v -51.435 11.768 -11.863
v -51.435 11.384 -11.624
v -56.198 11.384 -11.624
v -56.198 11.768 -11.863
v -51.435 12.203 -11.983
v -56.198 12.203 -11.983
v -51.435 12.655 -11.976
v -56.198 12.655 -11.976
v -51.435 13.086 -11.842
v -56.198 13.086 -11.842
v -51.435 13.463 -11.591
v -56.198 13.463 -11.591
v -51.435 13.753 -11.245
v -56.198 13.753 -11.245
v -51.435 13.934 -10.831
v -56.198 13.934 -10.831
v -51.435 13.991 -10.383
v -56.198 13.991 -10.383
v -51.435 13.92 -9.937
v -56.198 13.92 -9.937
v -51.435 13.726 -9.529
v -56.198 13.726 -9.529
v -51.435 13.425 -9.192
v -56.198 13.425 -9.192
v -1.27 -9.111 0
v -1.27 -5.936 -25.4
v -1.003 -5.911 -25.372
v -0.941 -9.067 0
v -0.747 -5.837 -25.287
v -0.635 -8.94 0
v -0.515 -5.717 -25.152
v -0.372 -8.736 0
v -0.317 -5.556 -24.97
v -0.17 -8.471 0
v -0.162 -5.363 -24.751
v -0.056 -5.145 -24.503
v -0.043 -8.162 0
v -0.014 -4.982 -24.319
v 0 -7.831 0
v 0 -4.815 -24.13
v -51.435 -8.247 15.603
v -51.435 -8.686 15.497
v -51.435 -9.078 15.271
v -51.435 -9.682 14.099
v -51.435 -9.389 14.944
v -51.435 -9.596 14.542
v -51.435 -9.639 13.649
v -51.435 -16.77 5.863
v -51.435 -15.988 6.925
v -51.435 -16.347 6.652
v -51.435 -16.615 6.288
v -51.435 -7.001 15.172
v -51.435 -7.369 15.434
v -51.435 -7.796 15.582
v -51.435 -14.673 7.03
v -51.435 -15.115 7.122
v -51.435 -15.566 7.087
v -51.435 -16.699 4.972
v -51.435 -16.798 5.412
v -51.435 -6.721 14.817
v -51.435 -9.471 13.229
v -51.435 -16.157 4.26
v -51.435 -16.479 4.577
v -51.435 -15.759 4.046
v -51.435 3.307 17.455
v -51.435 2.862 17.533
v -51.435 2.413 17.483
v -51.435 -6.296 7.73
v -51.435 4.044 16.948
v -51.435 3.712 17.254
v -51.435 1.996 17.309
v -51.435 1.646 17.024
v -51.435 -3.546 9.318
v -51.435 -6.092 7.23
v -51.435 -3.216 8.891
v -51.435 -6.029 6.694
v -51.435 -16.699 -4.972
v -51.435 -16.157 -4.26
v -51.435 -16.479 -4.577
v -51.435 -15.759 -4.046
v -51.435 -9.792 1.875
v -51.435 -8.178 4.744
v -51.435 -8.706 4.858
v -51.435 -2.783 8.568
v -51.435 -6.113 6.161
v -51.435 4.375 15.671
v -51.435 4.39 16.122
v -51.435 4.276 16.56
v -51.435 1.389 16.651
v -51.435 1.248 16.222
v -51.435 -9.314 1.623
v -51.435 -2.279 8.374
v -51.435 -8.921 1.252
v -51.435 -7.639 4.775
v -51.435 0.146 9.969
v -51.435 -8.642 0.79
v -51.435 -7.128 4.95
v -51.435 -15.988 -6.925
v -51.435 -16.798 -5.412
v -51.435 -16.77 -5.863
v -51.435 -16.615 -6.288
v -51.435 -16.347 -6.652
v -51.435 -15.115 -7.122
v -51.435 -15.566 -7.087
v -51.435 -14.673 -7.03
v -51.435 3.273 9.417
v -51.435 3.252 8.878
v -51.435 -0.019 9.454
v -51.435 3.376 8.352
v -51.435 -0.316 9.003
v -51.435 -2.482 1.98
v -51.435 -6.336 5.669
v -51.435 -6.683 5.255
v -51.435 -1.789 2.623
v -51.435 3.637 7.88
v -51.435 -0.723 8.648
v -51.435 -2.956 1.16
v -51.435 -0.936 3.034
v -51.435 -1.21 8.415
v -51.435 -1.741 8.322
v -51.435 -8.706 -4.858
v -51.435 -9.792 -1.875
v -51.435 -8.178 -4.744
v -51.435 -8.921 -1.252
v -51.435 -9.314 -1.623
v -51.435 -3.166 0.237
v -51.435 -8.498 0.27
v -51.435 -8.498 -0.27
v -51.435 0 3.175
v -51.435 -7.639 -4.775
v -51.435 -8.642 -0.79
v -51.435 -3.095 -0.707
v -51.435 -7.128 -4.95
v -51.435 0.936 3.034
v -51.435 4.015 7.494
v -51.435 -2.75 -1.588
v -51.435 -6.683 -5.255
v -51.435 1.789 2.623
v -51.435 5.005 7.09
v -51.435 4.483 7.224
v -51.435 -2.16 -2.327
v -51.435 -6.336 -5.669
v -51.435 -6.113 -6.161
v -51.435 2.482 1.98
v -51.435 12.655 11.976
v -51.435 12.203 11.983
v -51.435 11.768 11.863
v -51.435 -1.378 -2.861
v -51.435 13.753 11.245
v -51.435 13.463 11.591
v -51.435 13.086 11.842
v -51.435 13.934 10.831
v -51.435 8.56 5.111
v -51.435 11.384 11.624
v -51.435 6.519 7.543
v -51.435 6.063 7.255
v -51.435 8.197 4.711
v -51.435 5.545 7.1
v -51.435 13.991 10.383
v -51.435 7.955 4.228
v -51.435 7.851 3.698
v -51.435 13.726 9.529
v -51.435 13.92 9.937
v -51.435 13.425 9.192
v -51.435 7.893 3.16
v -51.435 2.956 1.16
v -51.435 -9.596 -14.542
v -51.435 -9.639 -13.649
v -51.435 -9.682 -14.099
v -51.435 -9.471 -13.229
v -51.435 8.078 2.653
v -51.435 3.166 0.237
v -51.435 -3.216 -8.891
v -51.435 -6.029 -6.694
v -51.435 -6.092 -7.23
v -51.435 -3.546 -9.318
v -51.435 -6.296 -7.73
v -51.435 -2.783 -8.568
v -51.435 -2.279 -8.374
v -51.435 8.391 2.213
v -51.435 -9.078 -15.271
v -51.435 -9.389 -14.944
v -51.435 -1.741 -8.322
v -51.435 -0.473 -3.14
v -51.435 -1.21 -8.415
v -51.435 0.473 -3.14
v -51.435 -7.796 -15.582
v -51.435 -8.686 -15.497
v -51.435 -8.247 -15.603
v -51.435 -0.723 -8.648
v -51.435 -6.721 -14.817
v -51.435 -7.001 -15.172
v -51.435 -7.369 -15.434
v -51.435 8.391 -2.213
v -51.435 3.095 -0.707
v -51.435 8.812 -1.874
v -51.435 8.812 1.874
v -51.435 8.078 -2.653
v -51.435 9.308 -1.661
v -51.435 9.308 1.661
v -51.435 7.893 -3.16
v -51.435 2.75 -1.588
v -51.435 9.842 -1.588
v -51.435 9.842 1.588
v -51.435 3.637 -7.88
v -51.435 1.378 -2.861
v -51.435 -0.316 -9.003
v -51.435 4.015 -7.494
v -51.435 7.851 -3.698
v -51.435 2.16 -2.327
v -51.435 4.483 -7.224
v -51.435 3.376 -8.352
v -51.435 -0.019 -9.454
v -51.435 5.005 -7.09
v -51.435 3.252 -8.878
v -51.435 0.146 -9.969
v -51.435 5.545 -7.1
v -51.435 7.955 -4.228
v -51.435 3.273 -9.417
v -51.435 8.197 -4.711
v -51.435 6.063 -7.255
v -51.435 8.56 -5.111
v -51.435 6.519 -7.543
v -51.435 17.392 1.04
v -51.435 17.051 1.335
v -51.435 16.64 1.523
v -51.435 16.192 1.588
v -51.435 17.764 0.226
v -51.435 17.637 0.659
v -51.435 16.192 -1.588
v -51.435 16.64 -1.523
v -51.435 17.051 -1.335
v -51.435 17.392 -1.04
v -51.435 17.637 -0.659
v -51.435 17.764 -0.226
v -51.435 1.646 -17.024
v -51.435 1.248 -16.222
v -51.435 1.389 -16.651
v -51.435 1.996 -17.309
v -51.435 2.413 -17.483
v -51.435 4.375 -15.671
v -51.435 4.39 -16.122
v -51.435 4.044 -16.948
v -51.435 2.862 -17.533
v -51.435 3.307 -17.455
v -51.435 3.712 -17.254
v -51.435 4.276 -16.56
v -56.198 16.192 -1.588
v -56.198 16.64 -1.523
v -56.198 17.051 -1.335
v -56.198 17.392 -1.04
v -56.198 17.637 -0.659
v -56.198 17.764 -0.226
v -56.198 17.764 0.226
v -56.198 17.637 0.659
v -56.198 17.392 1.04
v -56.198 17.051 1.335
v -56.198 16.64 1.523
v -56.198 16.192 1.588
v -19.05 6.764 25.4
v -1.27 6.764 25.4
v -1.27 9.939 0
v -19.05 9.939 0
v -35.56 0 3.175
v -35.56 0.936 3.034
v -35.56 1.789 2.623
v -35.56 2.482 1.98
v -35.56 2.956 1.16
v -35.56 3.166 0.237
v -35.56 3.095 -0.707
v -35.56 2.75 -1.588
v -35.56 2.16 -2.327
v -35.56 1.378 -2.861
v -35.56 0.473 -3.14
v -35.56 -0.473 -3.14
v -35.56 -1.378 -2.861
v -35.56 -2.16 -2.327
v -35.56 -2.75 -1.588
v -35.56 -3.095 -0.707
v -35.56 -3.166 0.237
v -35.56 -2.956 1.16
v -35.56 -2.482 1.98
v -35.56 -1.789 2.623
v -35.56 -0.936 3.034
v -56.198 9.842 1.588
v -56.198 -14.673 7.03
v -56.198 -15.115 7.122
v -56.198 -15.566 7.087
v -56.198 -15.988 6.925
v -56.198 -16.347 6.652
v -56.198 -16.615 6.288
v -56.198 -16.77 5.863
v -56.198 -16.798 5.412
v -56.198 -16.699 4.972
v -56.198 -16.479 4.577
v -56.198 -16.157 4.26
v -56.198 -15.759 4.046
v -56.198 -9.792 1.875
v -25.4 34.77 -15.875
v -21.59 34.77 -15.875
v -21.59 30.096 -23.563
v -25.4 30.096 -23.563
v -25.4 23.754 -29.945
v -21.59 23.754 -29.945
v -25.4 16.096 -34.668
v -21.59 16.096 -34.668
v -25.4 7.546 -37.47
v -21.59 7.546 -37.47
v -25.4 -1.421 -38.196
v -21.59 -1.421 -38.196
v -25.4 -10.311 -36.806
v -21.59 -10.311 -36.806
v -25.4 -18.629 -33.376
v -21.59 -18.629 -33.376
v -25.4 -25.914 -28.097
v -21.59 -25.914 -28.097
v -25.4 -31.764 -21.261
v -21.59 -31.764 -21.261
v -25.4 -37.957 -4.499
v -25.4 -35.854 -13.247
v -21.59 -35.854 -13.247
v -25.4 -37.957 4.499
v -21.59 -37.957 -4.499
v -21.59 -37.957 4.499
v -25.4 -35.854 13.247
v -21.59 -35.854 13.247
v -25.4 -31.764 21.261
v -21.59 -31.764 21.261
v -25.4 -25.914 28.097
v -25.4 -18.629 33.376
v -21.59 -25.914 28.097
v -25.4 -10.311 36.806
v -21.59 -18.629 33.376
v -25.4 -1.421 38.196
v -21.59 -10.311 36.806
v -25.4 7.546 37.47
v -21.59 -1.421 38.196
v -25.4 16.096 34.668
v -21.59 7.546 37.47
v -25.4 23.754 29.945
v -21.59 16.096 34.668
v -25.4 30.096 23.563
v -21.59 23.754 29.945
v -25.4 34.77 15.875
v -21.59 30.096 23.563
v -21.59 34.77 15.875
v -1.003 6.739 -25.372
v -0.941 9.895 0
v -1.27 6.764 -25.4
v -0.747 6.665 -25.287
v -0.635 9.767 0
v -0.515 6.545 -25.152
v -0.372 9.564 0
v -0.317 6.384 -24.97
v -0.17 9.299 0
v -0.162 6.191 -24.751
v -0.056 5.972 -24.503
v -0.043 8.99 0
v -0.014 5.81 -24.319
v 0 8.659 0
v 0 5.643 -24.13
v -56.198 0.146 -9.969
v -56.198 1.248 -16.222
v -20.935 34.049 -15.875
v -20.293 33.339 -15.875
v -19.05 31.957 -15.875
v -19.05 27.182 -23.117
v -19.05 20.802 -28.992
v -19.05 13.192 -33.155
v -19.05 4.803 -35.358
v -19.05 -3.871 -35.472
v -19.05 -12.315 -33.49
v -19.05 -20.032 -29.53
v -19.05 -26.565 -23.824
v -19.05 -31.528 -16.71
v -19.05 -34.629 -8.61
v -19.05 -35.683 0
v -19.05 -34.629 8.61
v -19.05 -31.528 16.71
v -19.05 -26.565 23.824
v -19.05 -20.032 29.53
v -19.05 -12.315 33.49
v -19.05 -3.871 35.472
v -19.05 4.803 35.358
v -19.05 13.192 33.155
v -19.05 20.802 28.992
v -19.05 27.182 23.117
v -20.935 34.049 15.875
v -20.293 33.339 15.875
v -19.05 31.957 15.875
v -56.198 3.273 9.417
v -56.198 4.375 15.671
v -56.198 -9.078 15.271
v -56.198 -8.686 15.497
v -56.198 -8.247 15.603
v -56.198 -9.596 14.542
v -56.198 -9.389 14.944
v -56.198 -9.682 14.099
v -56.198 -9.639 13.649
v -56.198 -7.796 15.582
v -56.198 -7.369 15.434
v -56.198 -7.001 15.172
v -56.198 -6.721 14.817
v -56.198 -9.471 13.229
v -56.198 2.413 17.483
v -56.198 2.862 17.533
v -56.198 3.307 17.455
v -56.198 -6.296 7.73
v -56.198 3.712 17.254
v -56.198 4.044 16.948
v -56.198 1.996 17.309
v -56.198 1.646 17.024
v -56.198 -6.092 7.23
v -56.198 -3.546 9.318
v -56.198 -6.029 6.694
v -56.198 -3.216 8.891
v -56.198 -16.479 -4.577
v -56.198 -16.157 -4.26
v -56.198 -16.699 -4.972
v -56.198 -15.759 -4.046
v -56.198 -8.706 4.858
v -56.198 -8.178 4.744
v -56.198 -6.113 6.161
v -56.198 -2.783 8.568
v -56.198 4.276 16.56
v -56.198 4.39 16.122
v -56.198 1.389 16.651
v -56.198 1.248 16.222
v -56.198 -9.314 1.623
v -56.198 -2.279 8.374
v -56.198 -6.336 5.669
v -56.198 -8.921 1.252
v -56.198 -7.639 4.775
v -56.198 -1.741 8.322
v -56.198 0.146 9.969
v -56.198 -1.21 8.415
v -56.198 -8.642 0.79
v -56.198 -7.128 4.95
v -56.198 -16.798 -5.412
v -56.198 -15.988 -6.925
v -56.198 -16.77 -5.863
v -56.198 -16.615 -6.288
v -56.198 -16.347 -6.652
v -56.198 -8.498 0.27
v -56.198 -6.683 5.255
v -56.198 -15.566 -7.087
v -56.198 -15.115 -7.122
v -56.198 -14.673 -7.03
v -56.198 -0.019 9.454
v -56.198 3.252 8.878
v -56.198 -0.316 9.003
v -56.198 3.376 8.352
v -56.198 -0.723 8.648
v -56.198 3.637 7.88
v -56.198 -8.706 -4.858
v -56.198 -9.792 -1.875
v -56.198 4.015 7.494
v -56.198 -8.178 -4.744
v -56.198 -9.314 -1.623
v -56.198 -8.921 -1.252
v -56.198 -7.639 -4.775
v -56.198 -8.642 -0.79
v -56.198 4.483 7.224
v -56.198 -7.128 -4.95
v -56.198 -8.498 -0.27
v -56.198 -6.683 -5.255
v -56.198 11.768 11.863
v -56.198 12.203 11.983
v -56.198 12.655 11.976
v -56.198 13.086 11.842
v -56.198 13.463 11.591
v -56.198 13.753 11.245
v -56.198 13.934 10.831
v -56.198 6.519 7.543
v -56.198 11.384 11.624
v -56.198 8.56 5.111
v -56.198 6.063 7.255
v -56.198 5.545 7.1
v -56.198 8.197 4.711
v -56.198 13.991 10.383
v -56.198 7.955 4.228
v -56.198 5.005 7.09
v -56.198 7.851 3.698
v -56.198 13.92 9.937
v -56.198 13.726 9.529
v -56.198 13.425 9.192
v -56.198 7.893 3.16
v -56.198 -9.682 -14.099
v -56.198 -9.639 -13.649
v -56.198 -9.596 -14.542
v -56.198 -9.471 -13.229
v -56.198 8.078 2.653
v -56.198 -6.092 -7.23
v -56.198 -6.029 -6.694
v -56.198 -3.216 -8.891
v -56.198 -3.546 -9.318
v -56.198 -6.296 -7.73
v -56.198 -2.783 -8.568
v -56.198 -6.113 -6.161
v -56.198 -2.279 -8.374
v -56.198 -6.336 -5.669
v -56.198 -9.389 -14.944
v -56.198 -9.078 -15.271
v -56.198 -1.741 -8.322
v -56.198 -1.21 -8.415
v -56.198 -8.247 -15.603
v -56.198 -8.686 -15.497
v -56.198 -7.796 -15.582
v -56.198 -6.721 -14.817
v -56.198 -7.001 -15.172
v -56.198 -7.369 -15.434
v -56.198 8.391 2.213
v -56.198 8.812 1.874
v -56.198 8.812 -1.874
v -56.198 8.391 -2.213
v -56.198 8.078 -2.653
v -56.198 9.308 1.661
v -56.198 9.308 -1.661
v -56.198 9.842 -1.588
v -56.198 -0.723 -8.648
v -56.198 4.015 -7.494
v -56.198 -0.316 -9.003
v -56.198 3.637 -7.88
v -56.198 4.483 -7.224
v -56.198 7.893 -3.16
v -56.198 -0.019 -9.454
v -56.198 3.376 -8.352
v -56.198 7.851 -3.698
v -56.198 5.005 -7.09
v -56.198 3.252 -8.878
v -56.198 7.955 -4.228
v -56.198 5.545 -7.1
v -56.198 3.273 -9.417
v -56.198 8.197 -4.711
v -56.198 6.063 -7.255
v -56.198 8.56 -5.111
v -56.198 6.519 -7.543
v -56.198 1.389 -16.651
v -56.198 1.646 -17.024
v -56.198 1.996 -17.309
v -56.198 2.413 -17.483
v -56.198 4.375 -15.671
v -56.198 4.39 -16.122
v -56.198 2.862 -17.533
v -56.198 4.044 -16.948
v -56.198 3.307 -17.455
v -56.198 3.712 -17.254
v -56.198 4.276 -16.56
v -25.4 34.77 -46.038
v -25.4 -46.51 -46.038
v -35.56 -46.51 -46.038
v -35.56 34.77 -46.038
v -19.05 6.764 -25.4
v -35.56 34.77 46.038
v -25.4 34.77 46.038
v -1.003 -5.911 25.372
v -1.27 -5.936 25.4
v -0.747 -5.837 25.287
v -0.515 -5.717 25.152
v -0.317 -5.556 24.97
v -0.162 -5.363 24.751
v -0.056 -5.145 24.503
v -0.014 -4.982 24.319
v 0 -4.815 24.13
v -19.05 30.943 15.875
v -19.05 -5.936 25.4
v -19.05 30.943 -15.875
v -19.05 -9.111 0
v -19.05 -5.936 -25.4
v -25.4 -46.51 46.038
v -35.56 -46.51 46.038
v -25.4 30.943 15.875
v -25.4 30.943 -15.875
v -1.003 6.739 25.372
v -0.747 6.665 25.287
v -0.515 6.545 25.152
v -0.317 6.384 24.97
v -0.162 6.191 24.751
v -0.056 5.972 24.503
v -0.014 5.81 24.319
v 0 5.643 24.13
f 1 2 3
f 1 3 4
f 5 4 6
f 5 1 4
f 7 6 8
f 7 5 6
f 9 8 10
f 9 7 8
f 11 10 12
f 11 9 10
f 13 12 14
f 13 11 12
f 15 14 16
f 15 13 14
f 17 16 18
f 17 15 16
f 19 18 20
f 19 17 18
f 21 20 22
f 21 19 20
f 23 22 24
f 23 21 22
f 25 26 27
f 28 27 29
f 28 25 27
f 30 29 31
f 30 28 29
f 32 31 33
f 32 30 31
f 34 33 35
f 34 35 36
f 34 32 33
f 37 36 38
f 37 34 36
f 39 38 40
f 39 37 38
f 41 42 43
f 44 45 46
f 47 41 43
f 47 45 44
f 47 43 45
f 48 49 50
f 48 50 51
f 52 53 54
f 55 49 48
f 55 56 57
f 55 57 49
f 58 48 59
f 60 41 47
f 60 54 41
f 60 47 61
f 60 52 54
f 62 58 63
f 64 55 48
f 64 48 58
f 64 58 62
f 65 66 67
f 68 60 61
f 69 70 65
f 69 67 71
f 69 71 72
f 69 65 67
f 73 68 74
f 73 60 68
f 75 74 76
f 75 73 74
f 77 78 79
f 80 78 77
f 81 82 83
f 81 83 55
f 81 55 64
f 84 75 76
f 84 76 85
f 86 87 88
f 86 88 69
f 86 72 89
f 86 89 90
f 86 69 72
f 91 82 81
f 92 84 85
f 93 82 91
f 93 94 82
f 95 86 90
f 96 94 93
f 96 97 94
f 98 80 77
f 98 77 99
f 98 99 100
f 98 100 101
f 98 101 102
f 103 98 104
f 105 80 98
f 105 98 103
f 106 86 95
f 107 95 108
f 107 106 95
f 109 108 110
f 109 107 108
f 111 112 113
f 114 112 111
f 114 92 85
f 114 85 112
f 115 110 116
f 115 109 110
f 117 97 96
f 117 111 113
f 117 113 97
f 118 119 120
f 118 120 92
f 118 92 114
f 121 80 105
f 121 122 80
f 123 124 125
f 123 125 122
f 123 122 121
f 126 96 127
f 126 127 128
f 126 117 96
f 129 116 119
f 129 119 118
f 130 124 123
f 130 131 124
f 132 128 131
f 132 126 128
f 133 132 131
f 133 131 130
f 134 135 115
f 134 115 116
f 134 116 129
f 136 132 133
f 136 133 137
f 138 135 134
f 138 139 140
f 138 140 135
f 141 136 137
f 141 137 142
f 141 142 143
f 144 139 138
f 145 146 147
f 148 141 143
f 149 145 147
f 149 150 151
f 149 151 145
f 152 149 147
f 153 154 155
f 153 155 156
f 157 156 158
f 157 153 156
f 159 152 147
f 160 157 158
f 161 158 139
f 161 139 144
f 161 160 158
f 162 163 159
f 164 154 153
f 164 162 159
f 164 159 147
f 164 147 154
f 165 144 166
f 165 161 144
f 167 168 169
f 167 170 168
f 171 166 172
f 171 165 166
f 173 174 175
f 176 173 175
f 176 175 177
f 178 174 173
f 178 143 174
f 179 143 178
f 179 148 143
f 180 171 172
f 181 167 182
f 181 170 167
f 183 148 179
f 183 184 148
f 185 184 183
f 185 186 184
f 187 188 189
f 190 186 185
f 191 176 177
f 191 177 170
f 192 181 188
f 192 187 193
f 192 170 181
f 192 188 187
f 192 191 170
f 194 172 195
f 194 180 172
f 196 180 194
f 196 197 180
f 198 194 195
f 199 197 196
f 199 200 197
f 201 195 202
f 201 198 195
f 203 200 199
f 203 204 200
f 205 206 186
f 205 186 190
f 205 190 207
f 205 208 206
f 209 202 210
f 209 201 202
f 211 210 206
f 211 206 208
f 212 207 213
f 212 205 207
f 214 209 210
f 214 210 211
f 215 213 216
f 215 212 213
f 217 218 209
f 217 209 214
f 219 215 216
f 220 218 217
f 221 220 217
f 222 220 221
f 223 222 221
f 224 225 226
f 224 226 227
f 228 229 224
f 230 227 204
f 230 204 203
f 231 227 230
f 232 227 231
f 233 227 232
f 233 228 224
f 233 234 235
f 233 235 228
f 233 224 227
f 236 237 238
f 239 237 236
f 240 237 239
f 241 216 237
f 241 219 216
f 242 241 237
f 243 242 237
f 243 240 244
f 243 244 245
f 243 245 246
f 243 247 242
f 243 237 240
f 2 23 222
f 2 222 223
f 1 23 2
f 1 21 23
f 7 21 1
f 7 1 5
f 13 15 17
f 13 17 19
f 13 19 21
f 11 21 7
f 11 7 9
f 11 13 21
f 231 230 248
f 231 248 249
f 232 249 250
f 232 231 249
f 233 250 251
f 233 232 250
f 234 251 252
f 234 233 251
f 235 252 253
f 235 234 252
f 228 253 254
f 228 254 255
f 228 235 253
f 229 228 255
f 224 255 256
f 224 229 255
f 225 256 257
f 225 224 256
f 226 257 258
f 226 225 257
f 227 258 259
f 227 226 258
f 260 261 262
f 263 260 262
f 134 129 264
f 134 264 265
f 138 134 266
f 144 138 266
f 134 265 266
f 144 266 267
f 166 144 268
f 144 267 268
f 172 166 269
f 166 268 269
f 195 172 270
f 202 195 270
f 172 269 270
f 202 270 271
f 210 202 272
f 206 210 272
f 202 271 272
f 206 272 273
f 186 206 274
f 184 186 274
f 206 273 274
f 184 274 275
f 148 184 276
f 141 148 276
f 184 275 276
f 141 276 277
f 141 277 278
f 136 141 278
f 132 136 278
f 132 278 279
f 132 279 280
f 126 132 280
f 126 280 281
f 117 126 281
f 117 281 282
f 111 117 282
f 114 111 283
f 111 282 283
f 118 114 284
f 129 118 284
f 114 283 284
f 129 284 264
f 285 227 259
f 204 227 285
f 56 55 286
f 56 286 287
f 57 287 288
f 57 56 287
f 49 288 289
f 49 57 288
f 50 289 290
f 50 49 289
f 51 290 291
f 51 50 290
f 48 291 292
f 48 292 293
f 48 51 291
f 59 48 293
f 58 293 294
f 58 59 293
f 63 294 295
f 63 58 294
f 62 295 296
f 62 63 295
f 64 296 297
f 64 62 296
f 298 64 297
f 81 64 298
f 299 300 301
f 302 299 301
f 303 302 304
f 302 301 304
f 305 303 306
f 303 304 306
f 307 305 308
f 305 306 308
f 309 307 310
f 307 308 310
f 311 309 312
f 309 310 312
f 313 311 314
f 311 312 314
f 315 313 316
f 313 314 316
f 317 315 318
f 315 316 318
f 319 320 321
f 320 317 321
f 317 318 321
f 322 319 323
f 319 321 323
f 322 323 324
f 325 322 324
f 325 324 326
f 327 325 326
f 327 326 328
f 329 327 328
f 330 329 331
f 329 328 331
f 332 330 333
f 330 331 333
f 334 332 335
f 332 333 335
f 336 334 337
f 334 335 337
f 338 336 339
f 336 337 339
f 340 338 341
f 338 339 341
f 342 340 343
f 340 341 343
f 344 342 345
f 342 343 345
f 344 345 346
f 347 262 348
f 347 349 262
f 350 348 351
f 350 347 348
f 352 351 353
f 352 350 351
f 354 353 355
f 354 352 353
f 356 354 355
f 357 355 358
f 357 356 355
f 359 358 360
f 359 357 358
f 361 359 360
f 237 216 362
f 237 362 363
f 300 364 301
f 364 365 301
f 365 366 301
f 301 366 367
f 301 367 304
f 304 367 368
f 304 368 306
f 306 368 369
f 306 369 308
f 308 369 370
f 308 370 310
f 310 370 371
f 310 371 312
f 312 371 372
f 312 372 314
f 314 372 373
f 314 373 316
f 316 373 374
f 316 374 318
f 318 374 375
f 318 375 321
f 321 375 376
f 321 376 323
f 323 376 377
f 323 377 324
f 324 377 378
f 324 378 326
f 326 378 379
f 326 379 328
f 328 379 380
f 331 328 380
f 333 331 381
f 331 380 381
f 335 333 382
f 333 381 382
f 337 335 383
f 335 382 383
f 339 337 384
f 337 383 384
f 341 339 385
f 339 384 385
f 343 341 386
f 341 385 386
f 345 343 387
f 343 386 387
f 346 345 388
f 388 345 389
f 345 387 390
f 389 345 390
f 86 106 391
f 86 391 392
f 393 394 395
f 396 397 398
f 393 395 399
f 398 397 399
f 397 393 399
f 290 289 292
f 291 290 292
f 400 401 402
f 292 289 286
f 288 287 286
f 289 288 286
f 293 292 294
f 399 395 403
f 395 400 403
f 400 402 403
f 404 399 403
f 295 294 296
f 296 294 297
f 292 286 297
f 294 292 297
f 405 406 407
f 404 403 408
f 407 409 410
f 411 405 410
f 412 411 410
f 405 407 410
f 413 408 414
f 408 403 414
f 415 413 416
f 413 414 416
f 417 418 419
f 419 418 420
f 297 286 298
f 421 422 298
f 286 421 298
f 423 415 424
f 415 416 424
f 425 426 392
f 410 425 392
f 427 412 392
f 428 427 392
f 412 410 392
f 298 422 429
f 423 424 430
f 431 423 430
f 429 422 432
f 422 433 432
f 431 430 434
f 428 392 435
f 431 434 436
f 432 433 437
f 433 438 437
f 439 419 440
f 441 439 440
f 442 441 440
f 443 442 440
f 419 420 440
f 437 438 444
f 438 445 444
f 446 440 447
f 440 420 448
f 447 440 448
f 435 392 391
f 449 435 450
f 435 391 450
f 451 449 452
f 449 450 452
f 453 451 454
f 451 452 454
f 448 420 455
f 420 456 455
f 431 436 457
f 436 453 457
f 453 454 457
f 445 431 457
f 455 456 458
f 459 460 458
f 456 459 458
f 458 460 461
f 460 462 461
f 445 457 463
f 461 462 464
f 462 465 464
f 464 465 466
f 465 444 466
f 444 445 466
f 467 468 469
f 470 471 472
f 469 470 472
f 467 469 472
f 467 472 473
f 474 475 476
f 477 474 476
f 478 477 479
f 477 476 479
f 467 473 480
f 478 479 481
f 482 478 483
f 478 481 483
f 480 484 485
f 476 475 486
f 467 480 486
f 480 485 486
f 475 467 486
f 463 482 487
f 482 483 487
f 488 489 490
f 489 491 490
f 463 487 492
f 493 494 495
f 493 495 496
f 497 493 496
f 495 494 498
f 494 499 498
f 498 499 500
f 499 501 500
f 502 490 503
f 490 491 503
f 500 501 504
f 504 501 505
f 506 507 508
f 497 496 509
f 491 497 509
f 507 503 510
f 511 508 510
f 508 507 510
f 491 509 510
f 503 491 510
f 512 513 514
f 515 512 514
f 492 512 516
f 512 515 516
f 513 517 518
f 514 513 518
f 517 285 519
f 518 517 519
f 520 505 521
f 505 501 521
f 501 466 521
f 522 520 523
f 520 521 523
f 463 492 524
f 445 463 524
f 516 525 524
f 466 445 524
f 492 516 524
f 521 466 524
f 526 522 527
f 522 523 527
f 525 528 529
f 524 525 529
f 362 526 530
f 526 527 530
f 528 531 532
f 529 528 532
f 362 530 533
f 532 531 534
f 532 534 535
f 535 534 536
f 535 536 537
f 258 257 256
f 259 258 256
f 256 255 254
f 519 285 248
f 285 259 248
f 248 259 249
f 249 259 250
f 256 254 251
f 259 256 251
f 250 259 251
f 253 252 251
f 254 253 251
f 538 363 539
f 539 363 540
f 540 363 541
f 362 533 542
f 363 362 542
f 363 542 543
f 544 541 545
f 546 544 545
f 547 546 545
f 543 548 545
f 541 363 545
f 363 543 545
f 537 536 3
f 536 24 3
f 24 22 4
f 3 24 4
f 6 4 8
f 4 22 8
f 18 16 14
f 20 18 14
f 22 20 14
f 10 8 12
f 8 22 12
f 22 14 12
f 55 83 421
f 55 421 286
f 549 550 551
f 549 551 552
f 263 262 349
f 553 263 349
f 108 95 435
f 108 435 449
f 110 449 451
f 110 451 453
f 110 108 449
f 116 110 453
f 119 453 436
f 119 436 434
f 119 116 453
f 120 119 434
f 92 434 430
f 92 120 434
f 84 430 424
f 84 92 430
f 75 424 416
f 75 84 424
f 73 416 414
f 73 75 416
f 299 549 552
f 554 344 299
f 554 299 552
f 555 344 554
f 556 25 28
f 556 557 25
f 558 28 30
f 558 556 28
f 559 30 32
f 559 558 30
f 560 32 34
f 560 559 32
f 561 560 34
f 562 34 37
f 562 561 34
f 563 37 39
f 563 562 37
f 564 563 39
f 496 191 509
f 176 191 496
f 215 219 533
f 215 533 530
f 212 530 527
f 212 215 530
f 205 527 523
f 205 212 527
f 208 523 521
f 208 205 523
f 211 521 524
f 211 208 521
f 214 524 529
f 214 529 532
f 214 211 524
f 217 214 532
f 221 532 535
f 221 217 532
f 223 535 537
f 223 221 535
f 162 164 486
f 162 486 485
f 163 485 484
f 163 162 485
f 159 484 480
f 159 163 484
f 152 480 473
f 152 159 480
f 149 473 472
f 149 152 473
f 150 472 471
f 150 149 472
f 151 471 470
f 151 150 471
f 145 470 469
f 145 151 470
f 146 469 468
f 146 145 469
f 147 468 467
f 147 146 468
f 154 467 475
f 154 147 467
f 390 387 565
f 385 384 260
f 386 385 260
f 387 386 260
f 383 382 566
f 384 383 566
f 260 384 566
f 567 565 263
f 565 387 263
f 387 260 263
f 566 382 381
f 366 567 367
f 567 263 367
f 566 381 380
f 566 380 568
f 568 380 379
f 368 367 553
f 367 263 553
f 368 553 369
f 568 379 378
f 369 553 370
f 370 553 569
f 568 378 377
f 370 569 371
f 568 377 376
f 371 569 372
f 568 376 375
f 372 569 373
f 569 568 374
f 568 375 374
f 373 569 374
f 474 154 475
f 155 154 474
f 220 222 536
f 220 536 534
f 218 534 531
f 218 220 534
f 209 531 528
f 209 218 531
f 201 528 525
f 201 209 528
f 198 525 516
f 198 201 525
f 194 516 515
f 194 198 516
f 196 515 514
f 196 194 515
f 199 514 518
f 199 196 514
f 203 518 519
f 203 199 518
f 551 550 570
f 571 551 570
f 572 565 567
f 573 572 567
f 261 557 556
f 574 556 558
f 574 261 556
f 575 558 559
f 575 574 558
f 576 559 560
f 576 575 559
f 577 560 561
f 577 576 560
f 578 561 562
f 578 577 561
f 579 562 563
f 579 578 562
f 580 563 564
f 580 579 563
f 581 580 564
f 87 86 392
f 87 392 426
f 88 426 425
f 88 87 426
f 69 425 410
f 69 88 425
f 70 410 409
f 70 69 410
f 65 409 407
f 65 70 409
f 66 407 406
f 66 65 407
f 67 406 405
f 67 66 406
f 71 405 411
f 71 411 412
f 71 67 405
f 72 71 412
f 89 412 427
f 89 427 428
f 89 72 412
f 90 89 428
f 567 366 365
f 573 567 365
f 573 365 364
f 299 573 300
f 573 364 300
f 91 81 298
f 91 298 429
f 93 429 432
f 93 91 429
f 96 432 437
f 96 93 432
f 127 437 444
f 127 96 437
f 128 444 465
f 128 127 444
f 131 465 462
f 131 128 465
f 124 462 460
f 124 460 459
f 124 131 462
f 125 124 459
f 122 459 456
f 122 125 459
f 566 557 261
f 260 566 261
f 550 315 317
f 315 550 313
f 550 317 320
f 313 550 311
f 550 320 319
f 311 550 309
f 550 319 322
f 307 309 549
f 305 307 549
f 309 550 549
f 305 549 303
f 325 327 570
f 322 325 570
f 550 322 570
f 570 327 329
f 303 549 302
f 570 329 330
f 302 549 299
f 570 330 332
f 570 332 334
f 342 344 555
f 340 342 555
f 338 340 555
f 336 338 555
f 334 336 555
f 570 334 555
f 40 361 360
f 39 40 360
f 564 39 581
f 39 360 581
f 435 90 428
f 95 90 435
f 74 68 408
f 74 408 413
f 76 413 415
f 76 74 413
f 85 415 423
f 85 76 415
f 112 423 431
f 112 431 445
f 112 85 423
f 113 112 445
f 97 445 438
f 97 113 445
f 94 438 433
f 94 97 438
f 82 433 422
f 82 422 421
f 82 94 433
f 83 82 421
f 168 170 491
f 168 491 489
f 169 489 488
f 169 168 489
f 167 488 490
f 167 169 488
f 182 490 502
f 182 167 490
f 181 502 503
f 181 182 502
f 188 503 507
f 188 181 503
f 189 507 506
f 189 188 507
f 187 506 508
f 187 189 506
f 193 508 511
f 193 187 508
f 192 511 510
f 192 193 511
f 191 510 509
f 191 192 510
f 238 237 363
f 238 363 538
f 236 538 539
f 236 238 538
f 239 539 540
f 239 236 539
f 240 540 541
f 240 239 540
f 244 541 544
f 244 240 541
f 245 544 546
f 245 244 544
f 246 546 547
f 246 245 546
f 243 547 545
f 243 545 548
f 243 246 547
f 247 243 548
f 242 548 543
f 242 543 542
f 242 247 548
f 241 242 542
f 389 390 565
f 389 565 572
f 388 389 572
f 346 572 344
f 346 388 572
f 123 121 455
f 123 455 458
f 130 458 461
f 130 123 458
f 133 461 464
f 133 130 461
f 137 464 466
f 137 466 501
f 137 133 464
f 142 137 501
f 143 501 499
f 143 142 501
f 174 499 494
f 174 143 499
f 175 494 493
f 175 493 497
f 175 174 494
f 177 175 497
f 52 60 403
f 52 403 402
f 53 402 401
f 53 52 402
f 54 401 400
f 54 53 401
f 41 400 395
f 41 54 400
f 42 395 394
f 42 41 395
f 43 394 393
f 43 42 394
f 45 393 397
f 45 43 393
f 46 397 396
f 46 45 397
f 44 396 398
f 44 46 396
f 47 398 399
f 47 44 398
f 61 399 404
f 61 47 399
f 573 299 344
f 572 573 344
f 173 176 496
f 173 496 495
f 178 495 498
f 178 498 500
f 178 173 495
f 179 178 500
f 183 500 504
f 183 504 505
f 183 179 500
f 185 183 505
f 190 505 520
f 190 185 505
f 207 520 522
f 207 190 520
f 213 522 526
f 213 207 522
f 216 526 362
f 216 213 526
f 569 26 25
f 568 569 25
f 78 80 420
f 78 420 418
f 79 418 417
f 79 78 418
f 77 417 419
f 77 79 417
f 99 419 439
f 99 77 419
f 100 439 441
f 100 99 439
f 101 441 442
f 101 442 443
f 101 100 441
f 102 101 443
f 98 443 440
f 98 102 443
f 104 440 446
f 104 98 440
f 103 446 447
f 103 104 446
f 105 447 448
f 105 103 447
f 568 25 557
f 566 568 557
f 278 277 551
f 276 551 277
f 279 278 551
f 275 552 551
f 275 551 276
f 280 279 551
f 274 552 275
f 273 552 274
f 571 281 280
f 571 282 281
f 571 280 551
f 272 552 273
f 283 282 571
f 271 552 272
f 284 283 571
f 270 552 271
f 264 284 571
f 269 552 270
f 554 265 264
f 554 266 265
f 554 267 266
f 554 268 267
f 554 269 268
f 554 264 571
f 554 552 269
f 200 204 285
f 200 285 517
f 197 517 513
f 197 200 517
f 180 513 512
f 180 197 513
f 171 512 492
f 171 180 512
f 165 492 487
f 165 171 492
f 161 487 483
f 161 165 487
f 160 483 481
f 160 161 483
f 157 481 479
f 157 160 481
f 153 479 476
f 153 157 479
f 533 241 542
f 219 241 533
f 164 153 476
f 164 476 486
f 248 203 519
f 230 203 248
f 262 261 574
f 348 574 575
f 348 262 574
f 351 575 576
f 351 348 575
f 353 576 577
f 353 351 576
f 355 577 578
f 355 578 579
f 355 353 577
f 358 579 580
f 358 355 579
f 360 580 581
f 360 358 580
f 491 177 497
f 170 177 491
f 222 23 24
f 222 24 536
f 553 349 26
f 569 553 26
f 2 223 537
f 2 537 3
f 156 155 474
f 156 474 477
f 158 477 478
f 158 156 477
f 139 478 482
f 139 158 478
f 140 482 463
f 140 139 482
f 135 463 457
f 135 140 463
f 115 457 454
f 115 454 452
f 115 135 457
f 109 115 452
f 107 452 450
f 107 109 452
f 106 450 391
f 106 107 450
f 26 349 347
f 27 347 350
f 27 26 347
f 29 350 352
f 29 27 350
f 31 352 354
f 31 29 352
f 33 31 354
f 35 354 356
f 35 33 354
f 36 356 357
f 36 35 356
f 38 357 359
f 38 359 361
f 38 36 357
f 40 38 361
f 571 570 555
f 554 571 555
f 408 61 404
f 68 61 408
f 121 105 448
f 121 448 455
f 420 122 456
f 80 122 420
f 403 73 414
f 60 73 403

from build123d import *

# Parameters (mm, degrees)
BOSS_EXTRUDE1_DEPTH = 19.05
SKETCH2_R           = 38.222793673
BOSS_EXTRUDE2_DEPTH = 6.35
SKETCH3_W           = 31.75
SKETCH3_H           = 13.333086578
CUT_EXTRUDE1_DEPTH  = 6.35
SKETCH4_W           = 92.075
SKETCH4_H           = 81.28
BOSS_EXTRUDE3_DEPTH = 10.16
CHAMFER1_SIZE       = 2.54
FILLET1_R           = 1.27
SKETCH5_R           = 3.175
BOSS_EXTRUDE4_DEPTH = 15.875
BOSS_EXTRUDE5_DEPTH = 4.7625


with BuildPart() as part:
    # Sketch1 → Boss-Extrude1 (new body)
    with BuildSketch(Plane(origin=(0, 0, 0), x_dir=(0, 0, -1), z_dir=(1, 0, 0))):
        Polygon((-25.4, -5.93604562), (-25.4, 6.76395438), (0, 9.93895438), (25.4, 6.76395438), (25.4, -5.93604562), (0, -9.11104562), align=None)
    extrude(amount=-BOSS_EXTRUDE1_DEPTH)

    # Sketch2 → Boss-Extrude2 (add)
    with BuildSketch(Plane.ZY.offset(19.05)):
        with Locations(Location((0, 0, 0), (0, 0, 180))):
            Circle(SKETCH2_R)
    extrude(amount=BOSS_EXTRUDE2_DEPTH)

    # Sketch3 → Cut-Extrude1 (cut)
    with BuildSketch(Plane(origin=(-19.05, 0, 0), x_dir=(0, 0, -1), z_dir=(1, 0, 0))):
        with Locations((0, 37.6091503)):
            Rectangle(SKETCH3_W, SKETCH3_H)
    extrude(amount=-CUT_EXTRUDE1_DEPTH, mode=Mode.SUBTRACT)

    # Sketch4 → Boss-Extrude3 (add)
    with BuildSketch(Plane.ZY.offset(25.4)):
        with Locations((0, -5.869806857)):
            Rectangle(SKETCH4_W, SKETCH4_H)
    extrude(amount=BOSS_EXTRUDE3_DEPTH)

    # Chamfer1
    chamfer1_edges = [part.edges().sort_by_distance(p)[0] for p in [
        (-19.05, -38.222793673, 0),
    ]]
    chamfer(chamfer1_edges, length=CHAMFER1_SIZE)

    # Fillet1
    fillet1_edges = [part.edges().sort_by_distance(p)[0] for p in [
        (0, 0.41395438, 25.4),
        (0, 8.35145438, 12.7),
        (0, 8.35145438, -12.7),
        (0, 0.41395438, -25.4),
        (0, -7.52354562, -12.7),
        (0, -7.52354562, 12.7),
    ]]
    fillet(fillet1_edges, radius=FILLET1_R)

    # Sketch5 → Boss-Extrude4 (add)
    with BuildSketch(Plane.ZY.offset(35.56)):
        Circle(SKETCH5_R)
    extrude(amount=BOSS_EXTRUDE4_DEPTH)

    # Sketch6 → Boss-Extrude5 (add)
    with BuildSketch(Plane.ZY.offset(51.435)):
        with BuildLine():
            Line((11.624433923, 11.383749315), (7.542732602, 6.519367101))
            ThreePointArc((7.542732602, 6.519367101), (7.34328288, 4.239646347), (9.417303827, 3.272514497))
            Line((9.417303827, 3.272514497), (15.670833059, 4.375180425))
            ThreePointArc((15.670833059, 4.375180425), (17.509881849, 3.087464599), (16.222166023, 1.248415809))
            Line((16.222166023, 1.248415809), (9.968636791, 0.145749881))
            ThreePointArc((9.968636791, 0.145749881), (8.350473186, -1.472413724), (9.317605037, -3.546434671))
            Line((9.317605037, -3.546434671), (14.816866351, -6.721434671))
            ThreePointArc((14.816866351, -6.721434671), (15.397931679, -8.89), (13.229366351, -9.471065329))
            Line((13.229366351, -9.471065329), (7.730105037, -6.296065329))
            ThreePointArc((7.730105037, -6.296065329), (5.450384283, -6.49551505), (4.858095296, -8.705967643))
            Line((4.858095296, -8.705967643), (7.029923206, -14.673015785))
            ThreePointArc((7.029923206, -14.673015785), (6.081118148, -16.707734798), (4.046399135, -15.75892974))
            Line((4.046399135, -15.75892974), (1.874571225, -9.791881598))
            ThreePointArc((1.874571225, -9.791881598), (0, -8.479292695), (-1.874571225, -9.791881598))
            Line((-1.874571225, -9.791881598), (-4.046399135, -15.75892974))
            ThreePointArc((-4.046399135, -15.75892974), (-6.081118148, -16.707734798), (-7.029923206, -14.673015785))
            Line((-7.029923206, -14.673015785), (-4.858095296, -8.705967643))
            ThreePointArc((-4.858095296, -8.705967643), (-5.450384283, -6.49551505), (-7.730105037, -6.296065329))
            Line((-7.730105037, -6.296065329), (-13.229366351, -9.471065329))
            ThreePointArc((-13.229366351, -9.471065329), (-15.397931679, -8.89), (-14.816866351, -6.721434671))
            Line((-14.816866351, -6.721434671), (-9.317605037, -3.546434671))
            ThreePointArc((-9.317605037, -3.546434671), (-8.350473186, -1.472413724), (-9.968636791, 0.145749881))
            Line((-9.968636791, 0.145749881), (-16.222166023, 1.248415809))
            ThreePointArc((-16.222166023, 1.248415809), (-17.509881849, 3.087464599), (-15.670833059, 4.375180425))
            Line((-15.670833059, 4.375180425), (-9.417303827, 3.272514497))
            ThreePointArc((-9.417303827, 3.272514497), (-7.34328288, 4.239646347), (-7.542732602, 6.519367101))
            Line((-7.542732602, 6.519367101), (-11.624433923, 11.383749315))
            ThreePointArc((-11.624433923, 11.383749315), (-11.4287637, 13.620270199), (-9.192242816, 13.424599976))
            Line((-9.192242816, 13.424599976), (-5.110541495, 8.560217762))
            ThreePointArc((-5.110541495, 8.560217762), (-2.900088903, 7.967928775), (-1.5875, 9.8425))
            Line((-1.5875, 9.8425), (-1.5875, 16.1925))
            ThreePointArc((-1.5875, 16.1925), (0, 17.78), (1.5875, 16.1925))
            Line((1.5875, 16.1925), (1.5875, 9.8425))
            ThreePointArc((1.5875, 9.8425), (2.900088903, 7.967928775), (5.110541495, 8.560217762))
            Line((5.110541495, 8.560217762), (9.192242816, 13.424599976))
            ThreePointArc((9.192242816, 13.424599976), (11.4287637, 13.620270199), (11.624433923, 11.383749315))
        make_face()
    extrude(amount=BOSS_EXTRUDE5_DEPTH)


solid = part.part
